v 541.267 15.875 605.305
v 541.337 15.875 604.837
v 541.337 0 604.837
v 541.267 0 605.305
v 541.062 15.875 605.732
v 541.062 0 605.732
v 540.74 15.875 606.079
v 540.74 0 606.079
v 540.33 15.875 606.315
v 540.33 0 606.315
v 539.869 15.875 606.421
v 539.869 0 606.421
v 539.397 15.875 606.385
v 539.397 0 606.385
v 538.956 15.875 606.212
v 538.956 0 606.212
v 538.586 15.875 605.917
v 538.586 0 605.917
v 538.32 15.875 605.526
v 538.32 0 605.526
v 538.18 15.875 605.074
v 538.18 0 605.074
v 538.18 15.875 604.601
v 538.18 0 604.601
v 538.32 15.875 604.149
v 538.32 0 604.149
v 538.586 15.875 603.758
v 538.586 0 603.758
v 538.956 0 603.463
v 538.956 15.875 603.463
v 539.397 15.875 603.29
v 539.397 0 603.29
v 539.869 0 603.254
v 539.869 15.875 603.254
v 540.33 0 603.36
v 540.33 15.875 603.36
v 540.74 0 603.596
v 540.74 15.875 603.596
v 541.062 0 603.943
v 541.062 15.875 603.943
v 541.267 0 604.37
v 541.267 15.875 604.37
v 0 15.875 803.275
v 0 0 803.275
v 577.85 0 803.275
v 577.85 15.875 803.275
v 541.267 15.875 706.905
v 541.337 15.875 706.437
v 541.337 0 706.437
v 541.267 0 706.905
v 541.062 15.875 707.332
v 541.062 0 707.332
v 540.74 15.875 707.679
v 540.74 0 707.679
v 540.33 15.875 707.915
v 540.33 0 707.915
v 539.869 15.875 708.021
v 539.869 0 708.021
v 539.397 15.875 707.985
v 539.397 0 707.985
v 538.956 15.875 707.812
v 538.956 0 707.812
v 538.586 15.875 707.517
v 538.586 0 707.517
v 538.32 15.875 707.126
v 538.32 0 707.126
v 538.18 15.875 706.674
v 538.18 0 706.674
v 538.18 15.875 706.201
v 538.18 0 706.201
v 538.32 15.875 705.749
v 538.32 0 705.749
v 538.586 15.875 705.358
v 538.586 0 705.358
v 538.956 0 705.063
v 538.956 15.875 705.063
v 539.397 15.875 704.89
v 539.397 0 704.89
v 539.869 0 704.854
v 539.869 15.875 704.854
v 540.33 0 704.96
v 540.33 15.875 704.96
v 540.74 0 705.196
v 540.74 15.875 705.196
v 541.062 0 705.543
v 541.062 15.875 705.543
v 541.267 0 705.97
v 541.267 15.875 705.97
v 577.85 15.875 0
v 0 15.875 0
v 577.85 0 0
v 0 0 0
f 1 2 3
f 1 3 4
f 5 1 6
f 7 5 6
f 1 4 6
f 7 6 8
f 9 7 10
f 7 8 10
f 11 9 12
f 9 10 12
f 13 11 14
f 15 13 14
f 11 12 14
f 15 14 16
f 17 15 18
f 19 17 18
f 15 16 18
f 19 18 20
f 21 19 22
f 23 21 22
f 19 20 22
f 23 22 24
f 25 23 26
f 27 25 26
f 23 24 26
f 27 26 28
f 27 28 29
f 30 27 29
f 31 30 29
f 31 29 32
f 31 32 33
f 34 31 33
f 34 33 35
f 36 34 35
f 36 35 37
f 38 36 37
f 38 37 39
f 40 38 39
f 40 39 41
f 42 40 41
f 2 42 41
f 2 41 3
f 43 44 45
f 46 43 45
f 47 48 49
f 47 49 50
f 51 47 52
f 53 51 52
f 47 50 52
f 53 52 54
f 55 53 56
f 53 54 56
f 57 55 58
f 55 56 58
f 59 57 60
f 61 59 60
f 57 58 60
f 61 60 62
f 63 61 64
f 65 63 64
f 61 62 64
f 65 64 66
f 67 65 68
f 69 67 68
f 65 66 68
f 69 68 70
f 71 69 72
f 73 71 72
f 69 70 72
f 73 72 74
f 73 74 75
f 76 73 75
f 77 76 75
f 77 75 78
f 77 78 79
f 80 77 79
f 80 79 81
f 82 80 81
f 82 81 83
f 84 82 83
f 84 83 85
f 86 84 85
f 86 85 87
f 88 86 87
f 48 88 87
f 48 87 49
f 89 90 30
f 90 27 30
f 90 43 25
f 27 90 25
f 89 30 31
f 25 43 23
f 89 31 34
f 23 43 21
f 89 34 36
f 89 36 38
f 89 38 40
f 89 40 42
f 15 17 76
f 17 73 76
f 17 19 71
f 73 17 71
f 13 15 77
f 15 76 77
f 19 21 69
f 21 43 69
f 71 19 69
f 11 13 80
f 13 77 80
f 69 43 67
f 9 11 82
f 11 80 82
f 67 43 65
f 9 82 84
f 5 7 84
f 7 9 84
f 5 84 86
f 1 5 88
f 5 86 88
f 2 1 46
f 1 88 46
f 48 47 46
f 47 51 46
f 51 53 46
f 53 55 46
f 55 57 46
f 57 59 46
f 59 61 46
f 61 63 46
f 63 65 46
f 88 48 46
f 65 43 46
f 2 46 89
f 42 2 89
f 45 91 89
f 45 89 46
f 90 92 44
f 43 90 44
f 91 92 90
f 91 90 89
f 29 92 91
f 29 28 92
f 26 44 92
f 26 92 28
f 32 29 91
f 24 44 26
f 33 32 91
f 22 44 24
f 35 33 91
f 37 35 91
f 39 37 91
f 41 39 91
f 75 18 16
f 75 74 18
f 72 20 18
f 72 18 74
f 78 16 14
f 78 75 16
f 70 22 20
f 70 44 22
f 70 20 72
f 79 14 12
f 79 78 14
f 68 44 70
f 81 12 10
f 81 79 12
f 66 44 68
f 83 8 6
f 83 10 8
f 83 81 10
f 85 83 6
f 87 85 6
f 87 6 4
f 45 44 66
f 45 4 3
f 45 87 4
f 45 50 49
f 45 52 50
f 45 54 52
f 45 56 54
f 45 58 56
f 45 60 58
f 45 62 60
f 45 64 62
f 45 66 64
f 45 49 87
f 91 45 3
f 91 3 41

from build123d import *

# Parameters (mm, degrees)
F0_W     = 577.85
F0_H     = 803.275
F1_DEPTH = 15.875
F2_R     = 1.5875
F3_DEPTH = 15.876


with BuildPart() as f1:
    # F0 (on Front) → F1 (new body)
    with BuildSketch(Plane.XZ):
        with Locations((288.925, 401.6375)):
            Rectangle(F0_W, F0_H)
    extrude(amount=-F1_DEPTH)

    # F2 (on face) → F3 (cut, through all)
    with BuildSketch(Plane.XZ):
        with Locations((539.74998, 706.43749)):
            Circle(F2_R)
        with Locations((539.74998, 604.837499)):
            Circle(F2_R)
    extrude(amount=-F3_DEPTH, mode=Mode.SUBTRACT)


solid = f1.part
